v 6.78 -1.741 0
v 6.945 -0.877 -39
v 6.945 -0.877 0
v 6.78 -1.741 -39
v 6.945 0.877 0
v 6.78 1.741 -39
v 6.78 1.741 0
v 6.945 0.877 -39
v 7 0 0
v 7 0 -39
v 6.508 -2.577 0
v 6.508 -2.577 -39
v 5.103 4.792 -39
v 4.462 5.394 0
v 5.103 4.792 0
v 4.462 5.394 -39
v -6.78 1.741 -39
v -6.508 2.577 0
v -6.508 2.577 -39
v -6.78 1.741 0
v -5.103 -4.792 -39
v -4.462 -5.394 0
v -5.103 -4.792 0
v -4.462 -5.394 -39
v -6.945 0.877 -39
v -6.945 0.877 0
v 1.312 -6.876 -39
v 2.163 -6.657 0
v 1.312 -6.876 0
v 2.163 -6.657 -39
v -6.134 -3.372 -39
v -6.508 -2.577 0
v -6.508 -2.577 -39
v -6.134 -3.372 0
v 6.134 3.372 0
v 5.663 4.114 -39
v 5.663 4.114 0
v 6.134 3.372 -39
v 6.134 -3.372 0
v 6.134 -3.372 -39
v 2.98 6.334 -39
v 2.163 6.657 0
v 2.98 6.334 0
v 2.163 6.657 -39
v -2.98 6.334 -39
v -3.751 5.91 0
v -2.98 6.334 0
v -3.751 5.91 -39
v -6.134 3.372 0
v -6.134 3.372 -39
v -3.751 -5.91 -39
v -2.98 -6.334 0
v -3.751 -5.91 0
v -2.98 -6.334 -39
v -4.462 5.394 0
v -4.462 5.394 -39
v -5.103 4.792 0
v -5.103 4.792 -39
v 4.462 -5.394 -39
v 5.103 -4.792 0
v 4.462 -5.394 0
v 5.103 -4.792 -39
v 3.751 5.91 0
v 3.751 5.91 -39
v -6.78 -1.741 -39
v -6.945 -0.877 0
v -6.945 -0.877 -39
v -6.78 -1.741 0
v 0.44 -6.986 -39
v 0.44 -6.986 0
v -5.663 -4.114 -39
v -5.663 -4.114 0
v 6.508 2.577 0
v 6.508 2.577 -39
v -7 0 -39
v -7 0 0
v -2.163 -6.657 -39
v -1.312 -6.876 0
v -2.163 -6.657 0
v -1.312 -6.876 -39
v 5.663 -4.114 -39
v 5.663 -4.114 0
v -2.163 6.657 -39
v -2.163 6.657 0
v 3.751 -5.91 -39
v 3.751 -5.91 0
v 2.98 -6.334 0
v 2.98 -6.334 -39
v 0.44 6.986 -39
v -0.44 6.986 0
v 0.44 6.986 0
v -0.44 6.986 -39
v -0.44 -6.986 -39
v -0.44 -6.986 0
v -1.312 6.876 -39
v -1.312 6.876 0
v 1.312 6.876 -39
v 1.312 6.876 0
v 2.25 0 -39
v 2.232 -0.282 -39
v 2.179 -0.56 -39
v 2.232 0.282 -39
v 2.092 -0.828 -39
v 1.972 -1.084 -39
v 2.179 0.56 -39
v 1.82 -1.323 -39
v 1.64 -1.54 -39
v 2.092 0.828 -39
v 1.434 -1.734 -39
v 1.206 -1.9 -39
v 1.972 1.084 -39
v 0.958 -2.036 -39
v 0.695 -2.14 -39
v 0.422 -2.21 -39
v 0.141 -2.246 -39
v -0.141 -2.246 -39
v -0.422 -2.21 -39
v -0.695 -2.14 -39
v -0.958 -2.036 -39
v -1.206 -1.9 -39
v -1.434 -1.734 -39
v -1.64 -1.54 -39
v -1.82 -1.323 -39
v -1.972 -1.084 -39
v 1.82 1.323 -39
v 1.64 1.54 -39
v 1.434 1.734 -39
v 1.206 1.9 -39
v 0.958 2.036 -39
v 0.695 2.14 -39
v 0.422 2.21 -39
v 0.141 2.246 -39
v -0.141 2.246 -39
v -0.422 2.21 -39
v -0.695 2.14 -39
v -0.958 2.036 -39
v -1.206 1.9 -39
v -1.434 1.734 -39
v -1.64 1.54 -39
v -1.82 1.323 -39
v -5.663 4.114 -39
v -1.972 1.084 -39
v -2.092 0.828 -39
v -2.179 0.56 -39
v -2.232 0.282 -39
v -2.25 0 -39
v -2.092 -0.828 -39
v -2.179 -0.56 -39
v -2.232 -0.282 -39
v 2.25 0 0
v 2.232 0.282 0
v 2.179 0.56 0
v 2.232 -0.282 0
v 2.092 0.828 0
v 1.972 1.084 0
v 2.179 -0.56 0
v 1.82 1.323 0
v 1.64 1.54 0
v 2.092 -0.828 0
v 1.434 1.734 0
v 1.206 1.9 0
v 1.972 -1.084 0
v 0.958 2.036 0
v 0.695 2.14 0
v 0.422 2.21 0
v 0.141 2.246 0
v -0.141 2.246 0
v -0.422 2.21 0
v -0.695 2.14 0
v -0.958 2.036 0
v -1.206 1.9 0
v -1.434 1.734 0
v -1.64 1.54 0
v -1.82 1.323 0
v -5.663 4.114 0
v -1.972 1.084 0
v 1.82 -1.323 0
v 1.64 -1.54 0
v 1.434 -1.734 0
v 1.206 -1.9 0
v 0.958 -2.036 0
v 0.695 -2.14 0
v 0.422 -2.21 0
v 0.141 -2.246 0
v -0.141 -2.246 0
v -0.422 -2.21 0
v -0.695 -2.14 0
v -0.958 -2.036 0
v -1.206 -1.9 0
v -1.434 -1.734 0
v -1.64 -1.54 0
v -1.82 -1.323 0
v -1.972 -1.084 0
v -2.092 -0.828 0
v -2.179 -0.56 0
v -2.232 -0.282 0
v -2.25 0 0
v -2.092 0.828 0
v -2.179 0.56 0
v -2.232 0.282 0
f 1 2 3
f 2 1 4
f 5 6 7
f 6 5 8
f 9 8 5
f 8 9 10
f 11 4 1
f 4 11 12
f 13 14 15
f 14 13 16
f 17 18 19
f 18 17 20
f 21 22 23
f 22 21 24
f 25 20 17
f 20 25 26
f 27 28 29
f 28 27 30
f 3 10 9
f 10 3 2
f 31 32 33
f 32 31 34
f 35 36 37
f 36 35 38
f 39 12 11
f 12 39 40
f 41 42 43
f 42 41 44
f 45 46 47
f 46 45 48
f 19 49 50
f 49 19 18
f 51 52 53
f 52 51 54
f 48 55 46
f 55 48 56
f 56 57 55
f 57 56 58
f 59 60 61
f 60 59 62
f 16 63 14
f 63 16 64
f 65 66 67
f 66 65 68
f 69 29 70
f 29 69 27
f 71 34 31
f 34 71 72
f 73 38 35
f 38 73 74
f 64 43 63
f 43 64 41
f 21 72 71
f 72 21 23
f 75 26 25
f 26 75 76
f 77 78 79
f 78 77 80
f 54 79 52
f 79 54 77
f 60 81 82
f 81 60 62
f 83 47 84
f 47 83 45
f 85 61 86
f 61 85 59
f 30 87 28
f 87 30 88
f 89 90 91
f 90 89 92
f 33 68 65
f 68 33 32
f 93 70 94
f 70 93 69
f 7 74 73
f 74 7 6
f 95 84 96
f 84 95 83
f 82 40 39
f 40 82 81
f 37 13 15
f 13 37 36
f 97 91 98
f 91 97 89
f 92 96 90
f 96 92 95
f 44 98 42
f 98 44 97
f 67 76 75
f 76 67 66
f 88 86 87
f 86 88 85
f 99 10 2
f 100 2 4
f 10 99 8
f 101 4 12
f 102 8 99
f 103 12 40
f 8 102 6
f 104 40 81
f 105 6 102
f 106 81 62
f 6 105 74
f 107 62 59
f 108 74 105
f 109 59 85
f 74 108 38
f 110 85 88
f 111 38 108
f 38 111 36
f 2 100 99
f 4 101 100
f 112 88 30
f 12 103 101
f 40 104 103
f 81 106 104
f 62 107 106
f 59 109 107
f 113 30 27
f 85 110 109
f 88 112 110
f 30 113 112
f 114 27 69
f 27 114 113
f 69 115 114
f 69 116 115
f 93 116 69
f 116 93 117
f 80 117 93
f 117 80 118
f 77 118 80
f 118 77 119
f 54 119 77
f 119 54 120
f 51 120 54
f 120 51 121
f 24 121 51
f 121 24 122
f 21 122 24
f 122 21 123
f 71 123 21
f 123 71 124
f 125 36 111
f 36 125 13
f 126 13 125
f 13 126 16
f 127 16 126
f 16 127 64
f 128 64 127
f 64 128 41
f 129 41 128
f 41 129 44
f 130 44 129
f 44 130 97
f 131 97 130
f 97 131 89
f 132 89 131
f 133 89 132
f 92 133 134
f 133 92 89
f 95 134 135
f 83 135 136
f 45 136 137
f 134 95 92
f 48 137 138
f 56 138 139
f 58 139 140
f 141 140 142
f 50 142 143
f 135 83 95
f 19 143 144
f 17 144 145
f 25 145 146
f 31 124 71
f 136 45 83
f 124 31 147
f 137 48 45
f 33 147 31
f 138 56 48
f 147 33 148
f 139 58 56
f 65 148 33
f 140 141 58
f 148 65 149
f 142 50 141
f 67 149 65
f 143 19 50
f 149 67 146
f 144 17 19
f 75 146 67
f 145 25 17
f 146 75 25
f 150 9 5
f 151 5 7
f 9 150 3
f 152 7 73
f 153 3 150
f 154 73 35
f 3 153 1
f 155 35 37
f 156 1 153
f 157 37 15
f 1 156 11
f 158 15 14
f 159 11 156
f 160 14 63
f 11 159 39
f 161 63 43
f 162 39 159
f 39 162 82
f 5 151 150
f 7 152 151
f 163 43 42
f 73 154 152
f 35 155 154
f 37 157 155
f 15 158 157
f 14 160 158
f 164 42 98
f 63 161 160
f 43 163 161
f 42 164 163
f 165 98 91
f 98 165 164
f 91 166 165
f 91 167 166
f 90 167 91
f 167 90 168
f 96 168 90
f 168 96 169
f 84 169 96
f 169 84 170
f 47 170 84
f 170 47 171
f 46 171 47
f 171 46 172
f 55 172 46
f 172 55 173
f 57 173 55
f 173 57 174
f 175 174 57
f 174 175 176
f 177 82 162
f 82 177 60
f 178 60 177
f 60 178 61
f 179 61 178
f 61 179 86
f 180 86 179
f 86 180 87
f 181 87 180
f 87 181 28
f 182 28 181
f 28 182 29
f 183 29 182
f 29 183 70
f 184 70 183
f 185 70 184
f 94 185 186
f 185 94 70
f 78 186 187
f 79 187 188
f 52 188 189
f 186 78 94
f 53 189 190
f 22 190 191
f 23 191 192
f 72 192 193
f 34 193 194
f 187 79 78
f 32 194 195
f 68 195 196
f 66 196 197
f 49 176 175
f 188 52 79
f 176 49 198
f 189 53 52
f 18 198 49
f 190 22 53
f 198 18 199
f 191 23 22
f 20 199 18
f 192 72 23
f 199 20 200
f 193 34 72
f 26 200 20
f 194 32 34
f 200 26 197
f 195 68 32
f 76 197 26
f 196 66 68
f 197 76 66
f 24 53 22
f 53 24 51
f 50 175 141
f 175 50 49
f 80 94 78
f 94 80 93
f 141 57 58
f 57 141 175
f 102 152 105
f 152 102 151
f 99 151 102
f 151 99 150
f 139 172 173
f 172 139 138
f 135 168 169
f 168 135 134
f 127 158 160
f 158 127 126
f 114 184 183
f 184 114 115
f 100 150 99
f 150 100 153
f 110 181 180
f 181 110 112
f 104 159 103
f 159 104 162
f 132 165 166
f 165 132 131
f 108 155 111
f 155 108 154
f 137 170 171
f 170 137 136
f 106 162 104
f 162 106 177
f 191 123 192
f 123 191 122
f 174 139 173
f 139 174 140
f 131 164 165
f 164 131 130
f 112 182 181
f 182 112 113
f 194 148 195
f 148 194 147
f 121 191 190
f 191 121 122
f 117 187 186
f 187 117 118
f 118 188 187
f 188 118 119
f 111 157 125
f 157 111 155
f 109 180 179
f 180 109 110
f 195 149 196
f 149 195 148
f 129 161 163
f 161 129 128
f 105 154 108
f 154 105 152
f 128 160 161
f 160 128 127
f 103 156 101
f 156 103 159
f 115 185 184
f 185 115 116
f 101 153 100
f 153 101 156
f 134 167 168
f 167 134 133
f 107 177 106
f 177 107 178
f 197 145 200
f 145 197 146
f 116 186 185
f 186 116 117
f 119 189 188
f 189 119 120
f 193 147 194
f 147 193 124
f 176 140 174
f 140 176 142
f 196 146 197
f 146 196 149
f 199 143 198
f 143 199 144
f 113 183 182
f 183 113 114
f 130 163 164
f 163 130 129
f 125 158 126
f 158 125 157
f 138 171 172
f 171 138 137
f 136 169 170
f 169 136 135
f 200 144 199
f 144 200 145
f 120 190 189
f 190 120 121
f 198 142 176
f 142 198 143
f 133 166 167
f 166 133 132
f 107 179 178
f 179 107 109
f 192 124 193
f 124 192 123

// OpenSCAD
$fn = 50;


difference() {
	union() {
		translate(v = [0, 0, -39.0000000000]) {
			cylinder(h = 39, r = 7.0000000000);
		}
		cylinder(h = 0, r = 10.0000000000);
	}
	union() {
		#translate(v = [0, 0, -39]) {
			cylinder(h = 39, r = 2.2500000000);
		}
	}
}
